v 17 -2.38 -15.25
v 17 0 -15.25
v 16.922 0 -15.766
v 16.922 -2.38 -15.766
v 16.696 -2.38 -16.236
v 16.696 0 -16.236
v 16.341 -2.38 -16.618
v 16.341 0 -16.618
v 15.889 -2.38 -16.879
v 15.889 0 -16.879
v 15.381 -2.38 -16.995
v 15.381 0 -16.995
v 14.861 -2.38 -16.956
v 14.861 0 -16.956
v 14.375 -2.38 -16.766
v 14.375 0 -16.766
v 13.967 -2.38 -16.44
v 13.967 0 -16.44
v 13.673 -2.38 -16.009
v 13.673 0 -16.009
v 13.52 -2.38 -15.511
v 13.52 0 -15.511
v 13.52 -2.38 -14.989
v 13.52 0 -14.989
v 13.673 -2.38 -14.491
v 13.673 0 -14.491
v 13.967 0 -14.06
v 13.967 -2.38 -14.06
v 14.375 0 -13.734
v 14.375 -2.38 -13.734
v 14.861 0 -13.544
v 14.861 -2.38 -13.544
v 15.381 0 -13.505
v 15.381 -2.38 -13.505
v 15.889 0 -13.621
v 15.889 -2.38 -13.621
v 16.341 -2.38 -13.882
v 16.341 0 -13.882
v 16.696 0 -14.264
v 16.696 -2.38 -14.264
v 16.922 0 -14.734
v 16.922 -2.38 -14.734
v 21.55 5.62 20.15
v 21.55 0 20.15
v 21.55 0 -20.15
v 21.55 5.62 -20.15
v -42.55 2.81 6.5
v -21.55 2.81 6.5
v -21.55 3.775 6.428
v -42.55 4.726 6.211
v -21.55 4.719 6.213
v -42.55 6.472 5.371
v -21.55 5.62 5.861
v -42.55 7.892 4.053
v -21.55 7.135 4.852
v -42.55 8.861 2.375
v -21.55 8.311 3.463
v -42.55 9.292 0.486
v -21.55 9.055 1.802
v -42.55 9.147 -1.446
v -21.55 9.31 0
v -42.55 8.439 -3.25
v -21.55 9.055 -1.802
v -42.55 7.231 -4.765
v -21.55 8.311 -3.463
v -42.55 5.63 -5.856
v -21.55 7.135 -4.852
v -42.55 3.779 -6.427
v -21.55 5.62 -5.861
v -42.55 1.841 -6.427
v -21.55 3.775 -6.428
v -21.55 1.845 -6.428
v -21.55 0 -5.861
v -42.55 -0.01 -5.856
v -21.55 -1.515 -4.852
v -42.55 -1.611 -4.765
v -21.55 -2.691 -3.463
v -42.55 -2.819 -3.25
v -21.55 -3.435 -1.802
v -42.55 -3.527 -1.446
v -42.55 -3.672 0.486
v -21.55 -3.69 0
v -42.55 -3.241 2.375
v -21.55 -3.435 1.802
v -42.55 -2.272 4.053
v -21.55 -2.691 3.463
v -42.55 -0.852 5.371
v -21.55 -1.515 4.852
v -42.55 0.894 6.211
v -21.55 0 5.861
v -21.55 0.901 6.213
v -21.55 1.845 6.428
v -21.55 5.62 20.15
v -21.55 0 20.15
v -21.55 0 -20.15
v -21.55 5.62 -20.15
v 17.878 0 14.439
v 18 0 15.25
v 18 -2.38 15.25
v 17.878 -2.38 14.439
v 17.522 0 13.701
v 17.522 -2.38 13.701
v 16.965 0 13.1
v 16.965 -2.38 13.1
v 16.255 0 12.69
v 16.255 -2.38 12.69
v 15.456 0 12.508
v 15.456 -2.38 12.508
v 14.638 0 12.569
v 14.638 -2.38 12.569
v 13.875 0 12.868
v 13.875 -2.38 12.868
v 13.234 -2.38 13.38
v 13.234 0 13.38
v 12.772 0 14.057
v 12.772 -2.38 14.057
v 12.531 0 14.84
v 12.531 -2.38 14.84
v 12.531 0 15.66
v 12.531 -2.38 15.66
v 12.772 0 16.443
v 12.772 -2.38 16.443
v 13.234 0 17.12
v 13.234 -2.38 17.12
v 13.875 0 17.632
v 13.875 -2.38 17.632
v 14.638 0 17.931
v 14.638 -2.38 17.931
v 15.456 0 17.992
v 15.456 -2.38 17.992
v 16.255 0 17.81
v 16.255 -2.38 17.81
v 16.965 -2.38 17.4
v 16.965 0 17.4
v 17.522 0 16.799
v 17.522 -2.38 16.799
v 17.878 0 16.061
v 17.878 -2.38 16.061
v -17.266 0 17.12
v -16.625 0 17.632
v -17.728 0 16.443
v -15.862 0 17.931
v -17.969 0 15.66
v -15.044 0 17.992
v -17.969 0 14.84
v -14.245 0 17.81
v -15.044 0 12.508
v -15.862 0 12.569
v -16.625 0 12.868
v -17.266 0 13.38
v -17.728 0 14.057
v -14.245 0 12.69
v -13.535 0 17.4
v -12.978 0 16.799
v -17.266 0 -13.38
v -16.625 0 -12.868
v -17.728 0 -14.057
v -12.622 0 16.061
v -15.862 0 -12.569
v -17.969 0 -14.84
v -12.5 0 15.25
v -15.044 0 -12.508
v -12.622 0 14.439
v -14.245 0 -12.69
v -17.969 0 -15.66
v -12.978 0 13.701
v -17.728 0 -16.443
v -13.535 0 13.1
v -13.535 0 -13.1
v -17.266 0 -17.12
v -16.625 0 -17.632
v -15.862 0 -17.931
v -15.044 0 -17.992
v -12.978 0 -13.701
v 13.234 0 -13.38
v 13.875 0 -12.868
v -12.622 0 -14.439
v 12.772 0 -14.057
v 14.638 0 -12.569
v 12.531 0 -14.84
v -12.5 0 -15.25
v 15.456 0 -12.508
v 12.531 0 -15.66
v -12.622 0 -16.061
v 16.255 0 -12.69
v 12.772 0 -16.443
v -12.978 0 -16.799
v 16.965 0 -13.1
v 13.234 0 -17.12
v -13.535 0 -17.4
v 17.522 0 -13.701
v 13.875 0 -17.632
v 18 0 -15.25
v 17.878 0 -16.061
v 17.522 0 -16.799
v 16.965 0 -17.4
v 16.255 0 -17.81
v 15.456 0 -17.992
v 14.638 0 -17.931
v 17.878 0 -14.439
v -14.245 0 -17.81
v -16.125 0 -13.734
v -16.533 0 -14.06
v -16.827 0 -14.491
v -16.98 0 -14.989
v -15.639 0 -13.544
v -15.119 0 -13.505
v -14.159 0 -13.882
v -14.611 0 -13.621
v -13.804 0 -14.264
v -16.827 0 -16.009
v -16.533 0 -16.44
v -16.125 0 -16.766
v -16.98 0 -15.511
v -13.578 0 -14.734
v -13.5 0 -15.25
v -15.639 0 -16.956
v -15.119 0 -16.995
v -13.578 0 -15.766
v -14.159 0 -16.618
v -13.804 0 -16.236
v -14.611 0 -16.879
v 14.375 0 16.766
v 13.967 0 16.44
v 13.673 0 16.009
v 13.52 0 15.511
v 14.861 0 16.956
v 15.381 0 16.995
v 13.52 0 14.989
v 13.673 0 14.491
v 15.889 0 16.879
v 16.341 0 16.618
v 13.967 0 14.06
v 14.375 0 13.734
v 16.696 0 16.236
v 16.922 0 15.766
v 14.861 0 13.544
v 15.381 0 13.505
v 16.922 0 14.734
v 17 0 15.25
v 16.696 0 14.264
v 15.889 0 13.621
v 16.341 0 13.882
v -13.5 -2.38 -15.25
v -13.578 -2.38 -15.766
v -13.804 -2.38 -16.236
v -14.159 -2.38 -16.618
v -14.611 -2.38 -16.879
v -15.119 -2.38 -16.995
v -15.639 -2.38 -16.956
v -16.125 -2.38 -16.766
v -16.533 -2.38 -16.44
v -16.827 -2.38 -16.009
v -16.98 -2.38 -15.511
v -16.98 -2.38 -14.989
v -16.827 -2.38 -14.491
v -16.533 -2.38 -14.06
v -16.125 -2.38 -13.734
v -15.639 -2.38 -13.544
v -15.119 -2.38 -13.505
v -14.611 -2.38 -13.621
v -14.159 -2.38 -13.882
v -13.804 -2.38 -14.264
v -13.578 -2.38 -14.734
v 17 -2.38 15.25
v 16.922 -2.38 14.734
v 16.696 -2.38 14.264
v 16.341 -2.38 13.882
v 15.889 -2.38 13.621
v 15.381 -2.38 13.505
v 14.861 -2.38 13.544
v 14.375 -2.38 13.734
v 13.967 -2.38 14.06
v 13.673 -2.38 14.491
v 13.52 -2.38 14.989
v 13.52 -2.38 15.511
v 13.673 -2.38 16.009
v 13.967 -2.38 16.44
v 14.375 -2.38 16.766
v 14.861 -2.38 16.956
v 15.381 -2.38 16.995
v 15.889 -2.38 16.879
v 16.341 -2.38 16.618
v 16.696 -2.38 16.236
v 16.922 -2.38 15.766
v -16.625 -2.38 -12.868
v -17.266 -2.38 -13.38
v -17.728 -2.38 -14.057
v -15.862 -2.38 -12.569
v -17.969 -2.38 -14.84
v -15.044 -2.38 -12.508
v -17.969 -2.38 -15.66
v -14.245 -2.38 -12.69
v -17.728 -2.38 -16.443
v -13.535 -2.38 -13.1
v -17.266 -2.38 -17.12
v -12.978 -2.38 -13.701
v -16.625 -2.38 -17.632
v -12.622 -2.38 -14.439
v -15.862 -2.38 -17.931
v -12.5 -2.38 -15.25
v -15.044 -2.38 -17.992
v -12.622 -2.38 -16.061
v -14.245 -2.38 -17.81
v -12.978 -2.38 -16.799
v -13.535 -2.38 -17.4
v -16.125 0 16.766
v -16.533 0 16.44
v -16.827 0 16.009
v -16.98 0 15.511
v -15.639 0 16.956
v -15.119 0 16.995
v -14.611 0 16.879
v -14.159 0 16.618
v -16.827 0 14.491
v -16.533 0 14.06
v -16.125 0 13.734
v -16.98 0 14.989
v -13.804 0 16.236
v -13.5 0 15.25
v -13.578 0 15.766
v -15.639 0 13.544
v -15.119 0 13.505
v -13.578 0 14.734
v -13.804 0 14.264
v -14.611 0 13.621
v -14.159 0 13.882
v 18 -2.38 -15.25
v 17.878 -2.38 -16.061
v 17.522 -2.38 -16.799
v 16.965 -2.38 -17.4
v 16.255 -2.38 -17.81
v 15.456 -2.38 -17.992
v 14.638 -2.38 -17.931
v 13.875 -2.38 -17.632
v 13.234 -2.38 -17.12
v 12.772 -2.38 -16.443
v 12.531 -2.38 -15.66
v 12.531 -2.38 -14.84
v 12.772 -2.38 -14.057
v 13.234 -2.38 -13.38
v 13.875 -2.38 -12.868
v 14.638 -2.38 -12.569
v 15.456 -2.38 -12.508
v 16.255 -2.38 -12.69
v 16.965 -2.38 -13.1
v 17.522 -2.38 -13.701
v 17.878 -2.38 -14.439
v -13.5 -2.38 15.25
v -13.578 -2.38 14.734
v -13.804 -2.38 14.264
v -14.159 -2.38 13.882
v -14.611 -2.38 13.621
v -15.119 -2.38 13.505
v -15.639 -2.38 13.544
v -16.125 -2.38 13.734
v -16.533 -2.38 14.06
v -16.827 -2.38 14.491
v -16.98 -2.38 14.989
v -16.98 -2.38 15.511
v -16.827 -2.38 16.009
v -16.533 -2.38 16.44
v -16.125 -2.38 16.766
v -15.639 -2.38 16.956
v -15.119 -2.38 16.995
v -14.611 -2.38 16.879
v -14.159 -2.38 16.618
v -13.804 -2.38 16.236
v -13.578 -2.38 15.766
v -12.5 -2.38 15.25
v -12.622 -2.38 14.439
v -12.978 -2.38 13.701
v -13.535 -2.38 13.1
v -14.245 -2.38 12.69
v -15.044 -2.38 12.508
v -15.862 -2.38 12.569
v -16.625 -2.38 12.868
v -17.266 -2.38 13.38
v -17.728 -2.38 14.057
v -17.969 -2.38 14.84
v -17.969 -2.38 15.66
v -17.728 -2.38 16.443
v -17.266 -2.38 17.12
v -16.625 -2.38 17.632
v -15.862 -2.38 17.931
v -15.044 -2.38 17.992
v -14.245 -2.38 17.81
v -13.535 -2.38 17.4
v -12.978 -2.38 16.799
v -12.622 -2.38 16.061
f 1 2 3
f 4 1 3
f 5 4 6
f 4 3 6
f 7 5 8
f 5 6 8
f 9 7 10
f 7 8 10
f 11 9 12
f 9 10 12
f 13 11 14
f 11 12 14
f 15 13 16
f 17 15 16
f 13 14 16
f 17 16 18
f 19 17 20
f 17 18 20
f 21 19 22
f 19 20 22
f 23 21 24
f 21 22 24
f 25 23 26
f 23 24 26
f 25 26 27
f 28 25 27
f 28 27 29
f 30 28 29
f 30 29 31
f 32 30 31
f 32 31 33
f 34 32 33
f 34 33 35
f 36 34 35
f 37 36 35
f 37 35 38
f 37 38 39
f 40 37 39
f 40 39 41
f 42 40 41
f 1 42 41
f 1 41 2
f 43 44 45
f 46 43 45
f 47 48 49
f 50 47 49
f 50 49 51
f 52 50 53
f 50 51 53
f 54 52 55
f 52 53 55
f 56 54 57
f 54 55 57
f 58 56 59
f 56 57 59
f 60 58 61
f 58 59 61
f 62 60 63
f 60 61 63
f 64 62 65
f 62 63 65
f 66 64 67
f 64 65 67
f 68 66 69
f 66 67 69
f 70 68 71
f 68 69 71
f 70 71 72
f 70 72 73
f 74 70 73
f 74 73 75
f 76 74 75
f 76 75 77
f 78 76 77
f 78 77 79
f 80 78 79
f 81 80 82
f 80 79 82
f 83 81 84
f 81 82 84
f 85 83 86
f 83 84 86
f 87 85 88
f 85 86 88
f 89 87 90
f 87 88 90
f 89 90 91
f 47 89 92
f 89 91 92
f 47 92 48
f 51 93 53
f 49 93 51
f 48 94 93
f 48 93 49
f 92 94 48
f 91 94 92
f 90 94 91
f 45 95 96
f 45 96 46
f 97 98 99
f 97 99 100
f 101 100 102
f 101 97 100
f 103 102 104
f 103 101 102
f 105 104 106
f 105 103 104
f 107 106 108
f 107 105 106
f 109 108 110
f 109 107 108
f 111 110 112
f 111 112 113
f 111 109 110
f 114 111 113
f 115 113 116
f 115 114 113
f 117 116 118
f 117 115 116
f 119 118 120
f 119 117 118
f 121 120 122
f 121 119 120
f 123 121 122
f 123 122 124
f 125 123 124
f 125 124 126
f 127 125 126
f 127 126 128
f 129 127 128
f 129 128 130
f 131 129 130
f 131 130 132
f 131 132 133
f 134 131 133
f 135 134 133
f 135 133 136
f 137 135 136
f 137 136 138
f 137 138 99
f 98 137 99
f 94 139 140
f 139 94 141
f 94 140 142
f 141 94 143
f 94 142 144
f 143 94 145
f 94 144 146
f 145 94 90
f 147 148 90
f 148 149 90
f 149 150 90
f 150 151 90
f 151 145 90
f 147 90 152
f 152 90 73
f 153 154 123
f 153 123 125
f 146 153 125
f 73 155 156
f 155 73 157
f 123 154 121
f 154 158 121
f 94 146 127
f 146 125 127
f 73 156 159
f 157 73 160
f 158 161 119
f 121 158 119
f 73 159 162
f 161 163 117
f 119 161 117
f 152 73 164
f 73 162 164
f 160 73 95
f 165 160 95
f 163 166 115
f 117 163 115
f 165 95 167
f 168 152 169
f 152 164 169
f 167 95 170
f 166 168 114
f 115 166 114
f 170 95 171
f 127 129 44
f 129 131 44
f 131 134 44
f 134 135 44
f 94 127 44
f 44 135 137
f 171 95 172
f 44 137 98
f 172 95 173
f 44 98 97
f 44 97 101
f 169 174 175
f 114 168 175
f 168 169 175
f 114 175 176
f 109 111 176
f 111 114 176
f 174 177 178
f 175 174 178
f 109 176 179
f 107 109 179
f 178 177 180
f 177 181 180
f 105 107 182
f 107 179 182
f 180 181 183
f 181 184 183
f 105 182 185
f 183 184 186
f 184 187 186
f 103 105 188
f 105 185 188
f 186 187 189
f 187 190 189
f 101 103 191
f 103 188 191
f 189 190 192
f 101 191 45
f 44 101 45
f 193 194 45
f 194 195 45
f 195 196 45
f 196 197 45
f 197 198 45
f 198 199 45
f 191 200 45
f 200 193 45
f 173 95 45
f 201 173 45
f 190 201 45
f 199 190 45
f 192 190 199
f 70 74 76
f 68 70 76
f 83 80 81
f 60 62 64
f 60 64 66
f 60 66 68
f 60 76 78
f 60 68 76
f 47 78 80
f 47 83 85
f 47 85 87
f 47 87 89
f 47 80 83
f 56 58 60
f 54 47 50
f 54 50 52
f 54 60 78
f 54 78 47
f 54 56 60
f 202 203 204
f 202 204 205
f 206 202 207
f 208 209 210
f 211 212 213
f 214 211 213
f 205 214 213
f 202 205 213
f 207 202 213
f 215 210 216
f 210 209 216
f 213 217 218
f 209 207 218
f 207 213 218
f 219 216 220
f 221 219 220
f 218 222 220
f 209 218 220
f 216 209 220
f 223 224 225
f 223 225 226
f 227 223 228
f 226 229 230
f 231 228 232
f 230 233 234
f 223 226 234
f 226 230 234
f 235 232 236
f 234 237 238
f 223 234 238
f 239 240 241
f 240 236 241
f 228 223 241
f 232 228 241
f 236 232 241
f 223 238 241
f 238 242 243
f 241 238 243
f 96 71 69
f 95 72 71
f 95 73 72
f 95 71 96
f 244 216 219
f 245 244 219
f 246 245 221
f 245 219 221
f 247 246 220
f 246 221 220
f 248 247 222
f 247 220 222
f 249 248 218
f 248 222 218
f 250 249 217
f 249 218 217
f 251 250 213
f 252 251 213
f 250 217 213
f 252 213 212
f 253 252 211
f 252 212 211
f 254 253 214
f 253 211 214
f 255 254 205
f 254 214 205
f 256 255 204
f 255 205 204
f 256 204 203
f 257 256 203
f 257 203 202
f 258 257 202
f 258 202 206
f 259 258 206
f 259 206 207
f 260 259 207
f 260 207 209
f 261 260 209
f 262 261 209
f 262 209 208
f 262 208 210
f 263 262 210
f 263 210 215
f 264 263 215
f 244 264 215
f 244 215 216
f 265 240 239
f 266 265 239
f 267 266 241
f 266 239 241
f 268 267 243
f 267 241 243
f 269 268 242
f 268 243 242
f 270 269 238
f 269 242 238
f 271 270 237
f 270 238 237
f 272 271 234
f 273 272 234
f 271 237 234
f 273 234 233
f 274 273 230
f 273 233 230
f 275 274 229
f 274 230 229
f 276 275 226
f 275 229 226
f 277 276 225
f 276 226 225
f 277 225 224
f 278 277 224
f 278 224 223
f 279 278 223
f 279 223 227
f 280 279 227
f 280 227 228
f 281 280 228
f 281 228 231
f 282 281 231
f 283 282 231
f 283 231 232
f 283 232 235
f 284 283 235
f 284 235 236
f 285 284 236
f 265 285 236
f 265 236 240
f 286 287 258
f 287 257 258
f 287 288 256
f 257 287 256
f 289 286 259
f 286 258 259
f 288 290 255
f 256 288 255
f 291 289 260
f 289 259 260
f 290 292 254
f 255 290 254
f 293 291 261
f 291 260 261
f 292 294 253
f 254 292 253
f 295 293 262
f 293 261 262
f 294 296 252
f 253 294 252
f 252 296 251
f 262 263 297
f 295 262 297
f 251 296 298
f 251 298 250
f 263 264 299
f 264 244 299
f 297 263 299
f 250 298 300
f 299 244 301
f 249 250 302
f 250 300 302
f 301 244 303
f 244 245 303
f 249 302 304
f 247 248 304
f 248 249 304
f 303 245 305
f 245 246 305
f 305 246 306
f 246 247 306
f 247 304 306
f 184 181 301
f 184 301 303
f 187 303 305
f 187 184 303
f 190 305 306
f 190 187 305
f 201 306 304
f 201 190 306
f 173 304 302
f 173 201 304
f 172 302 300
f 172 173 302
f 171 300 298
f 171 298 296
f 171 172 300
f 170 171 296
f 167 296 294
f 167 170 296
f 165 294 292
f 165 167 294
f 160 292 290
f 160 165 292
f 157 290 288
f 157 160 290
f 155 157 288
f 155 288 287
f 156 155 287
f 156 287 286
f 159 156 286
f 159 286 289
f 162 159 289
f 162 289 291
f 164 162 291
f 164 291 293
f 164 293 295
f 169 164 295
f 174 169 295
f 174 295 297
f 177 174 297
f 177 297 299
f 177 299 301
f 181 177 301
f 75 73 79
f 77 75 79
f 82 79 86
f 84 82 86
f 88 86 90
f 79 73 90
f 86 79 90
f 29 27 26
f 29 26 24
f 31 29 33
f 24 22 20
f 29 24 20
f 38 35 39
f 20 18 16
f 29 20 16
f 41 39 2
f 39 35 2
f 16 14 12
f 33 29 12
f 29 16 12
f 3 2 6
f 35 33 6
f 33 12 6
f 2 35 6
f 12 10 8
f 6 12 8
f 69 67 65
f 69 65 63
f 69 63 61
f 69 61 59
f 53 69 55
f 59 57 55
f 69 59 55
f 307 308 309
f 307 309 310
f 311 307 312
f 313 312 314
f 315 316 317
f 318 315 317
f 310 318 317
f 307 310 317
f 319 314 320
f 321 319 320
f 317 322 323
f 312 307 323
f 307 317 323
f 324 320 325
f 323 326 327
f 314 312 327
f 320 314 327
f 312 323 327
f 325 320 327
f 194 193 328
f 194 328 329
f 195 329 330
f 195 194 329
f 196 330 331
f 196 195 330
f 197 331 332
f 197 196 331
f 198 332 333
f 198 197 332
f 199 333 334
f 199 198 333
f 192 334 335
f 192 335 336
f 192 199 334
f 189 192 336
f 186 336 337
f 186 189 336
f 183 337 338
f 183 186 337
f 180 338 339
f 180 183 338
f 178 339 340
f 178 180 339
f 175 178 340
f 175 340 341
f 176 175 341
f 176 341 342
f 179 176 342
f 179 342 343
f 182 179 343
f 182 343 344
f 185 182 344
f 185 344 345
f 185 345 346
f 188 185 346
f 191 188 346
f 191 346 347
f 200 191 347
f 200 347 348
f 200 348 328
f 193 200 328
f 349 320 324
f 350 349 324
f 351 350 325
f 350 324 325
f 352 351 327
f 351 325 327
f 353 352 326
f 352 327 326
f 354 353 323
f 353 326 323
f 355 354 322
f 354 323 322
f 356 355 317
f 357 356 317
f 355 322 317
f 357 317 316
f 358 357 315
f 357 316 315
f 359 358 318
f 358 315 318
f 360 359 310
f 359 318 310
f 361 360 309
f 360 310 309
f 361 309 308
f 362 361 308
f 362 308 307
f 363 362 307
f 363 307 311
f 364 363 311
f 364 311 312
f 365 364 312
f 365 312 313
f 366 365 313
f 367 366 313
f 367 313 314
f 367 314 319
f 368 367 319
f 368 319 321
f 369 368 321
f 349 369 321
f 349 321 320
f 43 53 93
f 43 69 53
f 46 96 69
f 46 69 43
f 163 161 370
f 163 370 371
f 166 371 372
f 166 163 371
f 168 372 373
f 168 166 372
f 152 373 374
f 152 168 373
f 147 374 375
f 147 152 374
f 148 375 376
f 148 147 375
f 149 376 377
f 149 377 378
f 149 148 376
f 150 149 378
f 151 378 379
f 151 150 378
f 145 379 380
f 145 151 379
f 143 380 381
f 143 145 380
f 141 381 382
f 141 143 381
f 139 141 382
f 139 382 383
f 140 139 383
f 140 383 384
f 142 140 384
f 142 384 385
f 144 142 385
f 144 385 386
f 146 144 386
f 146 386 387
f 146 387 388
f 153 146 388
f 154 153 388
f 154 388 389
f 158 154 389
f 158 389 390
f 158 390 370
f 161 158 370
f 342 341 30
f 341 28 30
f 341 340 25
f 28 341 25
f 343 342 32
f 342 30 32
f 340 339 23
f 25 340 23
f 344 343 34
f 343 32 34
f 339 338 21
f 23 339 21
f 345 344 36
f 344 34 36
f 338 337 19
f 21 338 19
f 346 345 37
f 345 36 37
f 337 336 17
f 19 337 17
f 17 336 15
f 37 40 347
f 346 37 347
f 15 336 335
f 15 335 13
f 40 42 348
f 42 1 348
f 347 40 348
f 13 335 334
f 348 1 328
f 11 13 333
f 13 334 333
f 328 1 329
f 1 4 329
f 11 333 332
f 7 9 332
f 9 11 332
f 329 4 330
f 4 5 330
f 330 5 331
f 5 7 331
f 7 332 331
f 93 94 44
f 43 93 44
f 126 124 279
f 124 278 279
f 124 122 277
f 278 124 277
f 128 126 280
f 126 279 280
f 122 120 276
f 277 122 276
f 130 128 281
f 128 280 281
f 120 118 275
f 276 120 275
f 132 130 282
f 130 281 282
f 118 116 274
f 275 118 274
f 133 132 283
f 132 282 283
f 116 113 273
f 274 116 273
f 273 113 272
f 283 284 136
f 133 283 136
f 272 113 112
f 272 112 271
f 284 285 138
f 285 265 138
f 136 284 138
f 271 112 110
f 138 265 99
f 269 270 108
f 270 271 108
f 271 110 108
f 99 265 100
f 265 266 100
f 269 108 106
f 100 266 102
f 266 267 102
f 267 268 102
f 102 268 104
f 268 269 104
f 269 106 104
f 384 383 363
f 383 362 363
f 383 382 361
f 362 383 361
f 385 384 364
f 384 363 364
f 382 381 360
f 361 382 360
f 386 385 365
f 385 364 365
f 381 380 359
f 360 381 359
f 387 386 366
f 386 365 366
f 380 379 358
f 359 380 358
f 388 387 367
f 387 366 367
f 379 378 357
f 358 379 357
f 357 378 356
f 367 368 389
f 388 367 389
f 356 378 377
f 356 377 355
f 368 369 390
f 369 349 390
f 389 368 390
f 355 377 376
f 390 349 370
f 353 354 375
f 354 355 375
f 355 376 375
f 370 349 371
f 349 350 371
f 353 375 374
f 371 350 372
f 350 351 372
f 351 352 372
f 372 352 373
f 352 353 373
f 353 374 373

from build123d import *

# Parameters (mm, degrees)
SKETCH1_W           = 43.1
SKETCH1_H           = 40.3
BOSS_EXTRUDE1_DEPTH = 5.62
SKETCH2_R           = 2.75
SKETCH2_R_2         = 1.75
BOSS_EXTRUDE2_DEPTH = 8
SKETCH3_R           = 6.5
BOSS_EXTRUDE3_DEPTH = 21


with BuildPart() as part:
    # Sketch1 → Boss-Extrude1 (new body)
    with BuildSketch(Plane(origin=(0, 0, 0), x_dir=(1, 0, 0), z_dir=(0, 1, 0))):
        Rectangle(SKETCH1_W, SKETCH1_H)
    extrude(amount=BOSS_EXTRUDE1_DEPTH)

    # Sketch2 → Boss-Extrude2 (add)
    with BuildSketch(Plane(origin=(0, 5.62, 0), x_dir=(1, 0, 0), z_dir=(0, 1, 0))):
        with Locations((-15.25, 15.25)):
            Circle(SKETCH2_R)
        with Locations((-15.25, 15.25)):
            Circle(SKETCH2_R_2, mode=Mode.SUBTRACT)
        with Locations((15.25, 15.25)):
            Circle(SKETCH2_R)
        with Locations((15.25, 15.25)):
            Circle(SKETCH2_R_2, mode=Mode.SUBTRACT)
        with Locations((15.25, -15.25)):
            Circle(SKETCH2_R)
        with Locations((15.25, -15.25)):
            Circle(SKETCH2_R_2, mode=Mode.SUBTRACT)
        with Locations((-15.25, -15.25)):
            Circle(SKETCH2_R)
        with Locations((-15.25, -15.25)):
            Circle(SKETCH2_R_2, mode=Mode.SUBTRACT)
    extrude(amount=-BOSS_EXTRUDE2_DEPTH)

    # Sketch3 → Boss-Extrude3 (add)
    with BuildSketch(Plane.ZY.offset(21.55)):
        with Locations((0, 2.81)):
            Circle(SKETCH3_R)
    extrude(amount=BOSS_EXTRUDE3_DEPTH)


solid = part.part
